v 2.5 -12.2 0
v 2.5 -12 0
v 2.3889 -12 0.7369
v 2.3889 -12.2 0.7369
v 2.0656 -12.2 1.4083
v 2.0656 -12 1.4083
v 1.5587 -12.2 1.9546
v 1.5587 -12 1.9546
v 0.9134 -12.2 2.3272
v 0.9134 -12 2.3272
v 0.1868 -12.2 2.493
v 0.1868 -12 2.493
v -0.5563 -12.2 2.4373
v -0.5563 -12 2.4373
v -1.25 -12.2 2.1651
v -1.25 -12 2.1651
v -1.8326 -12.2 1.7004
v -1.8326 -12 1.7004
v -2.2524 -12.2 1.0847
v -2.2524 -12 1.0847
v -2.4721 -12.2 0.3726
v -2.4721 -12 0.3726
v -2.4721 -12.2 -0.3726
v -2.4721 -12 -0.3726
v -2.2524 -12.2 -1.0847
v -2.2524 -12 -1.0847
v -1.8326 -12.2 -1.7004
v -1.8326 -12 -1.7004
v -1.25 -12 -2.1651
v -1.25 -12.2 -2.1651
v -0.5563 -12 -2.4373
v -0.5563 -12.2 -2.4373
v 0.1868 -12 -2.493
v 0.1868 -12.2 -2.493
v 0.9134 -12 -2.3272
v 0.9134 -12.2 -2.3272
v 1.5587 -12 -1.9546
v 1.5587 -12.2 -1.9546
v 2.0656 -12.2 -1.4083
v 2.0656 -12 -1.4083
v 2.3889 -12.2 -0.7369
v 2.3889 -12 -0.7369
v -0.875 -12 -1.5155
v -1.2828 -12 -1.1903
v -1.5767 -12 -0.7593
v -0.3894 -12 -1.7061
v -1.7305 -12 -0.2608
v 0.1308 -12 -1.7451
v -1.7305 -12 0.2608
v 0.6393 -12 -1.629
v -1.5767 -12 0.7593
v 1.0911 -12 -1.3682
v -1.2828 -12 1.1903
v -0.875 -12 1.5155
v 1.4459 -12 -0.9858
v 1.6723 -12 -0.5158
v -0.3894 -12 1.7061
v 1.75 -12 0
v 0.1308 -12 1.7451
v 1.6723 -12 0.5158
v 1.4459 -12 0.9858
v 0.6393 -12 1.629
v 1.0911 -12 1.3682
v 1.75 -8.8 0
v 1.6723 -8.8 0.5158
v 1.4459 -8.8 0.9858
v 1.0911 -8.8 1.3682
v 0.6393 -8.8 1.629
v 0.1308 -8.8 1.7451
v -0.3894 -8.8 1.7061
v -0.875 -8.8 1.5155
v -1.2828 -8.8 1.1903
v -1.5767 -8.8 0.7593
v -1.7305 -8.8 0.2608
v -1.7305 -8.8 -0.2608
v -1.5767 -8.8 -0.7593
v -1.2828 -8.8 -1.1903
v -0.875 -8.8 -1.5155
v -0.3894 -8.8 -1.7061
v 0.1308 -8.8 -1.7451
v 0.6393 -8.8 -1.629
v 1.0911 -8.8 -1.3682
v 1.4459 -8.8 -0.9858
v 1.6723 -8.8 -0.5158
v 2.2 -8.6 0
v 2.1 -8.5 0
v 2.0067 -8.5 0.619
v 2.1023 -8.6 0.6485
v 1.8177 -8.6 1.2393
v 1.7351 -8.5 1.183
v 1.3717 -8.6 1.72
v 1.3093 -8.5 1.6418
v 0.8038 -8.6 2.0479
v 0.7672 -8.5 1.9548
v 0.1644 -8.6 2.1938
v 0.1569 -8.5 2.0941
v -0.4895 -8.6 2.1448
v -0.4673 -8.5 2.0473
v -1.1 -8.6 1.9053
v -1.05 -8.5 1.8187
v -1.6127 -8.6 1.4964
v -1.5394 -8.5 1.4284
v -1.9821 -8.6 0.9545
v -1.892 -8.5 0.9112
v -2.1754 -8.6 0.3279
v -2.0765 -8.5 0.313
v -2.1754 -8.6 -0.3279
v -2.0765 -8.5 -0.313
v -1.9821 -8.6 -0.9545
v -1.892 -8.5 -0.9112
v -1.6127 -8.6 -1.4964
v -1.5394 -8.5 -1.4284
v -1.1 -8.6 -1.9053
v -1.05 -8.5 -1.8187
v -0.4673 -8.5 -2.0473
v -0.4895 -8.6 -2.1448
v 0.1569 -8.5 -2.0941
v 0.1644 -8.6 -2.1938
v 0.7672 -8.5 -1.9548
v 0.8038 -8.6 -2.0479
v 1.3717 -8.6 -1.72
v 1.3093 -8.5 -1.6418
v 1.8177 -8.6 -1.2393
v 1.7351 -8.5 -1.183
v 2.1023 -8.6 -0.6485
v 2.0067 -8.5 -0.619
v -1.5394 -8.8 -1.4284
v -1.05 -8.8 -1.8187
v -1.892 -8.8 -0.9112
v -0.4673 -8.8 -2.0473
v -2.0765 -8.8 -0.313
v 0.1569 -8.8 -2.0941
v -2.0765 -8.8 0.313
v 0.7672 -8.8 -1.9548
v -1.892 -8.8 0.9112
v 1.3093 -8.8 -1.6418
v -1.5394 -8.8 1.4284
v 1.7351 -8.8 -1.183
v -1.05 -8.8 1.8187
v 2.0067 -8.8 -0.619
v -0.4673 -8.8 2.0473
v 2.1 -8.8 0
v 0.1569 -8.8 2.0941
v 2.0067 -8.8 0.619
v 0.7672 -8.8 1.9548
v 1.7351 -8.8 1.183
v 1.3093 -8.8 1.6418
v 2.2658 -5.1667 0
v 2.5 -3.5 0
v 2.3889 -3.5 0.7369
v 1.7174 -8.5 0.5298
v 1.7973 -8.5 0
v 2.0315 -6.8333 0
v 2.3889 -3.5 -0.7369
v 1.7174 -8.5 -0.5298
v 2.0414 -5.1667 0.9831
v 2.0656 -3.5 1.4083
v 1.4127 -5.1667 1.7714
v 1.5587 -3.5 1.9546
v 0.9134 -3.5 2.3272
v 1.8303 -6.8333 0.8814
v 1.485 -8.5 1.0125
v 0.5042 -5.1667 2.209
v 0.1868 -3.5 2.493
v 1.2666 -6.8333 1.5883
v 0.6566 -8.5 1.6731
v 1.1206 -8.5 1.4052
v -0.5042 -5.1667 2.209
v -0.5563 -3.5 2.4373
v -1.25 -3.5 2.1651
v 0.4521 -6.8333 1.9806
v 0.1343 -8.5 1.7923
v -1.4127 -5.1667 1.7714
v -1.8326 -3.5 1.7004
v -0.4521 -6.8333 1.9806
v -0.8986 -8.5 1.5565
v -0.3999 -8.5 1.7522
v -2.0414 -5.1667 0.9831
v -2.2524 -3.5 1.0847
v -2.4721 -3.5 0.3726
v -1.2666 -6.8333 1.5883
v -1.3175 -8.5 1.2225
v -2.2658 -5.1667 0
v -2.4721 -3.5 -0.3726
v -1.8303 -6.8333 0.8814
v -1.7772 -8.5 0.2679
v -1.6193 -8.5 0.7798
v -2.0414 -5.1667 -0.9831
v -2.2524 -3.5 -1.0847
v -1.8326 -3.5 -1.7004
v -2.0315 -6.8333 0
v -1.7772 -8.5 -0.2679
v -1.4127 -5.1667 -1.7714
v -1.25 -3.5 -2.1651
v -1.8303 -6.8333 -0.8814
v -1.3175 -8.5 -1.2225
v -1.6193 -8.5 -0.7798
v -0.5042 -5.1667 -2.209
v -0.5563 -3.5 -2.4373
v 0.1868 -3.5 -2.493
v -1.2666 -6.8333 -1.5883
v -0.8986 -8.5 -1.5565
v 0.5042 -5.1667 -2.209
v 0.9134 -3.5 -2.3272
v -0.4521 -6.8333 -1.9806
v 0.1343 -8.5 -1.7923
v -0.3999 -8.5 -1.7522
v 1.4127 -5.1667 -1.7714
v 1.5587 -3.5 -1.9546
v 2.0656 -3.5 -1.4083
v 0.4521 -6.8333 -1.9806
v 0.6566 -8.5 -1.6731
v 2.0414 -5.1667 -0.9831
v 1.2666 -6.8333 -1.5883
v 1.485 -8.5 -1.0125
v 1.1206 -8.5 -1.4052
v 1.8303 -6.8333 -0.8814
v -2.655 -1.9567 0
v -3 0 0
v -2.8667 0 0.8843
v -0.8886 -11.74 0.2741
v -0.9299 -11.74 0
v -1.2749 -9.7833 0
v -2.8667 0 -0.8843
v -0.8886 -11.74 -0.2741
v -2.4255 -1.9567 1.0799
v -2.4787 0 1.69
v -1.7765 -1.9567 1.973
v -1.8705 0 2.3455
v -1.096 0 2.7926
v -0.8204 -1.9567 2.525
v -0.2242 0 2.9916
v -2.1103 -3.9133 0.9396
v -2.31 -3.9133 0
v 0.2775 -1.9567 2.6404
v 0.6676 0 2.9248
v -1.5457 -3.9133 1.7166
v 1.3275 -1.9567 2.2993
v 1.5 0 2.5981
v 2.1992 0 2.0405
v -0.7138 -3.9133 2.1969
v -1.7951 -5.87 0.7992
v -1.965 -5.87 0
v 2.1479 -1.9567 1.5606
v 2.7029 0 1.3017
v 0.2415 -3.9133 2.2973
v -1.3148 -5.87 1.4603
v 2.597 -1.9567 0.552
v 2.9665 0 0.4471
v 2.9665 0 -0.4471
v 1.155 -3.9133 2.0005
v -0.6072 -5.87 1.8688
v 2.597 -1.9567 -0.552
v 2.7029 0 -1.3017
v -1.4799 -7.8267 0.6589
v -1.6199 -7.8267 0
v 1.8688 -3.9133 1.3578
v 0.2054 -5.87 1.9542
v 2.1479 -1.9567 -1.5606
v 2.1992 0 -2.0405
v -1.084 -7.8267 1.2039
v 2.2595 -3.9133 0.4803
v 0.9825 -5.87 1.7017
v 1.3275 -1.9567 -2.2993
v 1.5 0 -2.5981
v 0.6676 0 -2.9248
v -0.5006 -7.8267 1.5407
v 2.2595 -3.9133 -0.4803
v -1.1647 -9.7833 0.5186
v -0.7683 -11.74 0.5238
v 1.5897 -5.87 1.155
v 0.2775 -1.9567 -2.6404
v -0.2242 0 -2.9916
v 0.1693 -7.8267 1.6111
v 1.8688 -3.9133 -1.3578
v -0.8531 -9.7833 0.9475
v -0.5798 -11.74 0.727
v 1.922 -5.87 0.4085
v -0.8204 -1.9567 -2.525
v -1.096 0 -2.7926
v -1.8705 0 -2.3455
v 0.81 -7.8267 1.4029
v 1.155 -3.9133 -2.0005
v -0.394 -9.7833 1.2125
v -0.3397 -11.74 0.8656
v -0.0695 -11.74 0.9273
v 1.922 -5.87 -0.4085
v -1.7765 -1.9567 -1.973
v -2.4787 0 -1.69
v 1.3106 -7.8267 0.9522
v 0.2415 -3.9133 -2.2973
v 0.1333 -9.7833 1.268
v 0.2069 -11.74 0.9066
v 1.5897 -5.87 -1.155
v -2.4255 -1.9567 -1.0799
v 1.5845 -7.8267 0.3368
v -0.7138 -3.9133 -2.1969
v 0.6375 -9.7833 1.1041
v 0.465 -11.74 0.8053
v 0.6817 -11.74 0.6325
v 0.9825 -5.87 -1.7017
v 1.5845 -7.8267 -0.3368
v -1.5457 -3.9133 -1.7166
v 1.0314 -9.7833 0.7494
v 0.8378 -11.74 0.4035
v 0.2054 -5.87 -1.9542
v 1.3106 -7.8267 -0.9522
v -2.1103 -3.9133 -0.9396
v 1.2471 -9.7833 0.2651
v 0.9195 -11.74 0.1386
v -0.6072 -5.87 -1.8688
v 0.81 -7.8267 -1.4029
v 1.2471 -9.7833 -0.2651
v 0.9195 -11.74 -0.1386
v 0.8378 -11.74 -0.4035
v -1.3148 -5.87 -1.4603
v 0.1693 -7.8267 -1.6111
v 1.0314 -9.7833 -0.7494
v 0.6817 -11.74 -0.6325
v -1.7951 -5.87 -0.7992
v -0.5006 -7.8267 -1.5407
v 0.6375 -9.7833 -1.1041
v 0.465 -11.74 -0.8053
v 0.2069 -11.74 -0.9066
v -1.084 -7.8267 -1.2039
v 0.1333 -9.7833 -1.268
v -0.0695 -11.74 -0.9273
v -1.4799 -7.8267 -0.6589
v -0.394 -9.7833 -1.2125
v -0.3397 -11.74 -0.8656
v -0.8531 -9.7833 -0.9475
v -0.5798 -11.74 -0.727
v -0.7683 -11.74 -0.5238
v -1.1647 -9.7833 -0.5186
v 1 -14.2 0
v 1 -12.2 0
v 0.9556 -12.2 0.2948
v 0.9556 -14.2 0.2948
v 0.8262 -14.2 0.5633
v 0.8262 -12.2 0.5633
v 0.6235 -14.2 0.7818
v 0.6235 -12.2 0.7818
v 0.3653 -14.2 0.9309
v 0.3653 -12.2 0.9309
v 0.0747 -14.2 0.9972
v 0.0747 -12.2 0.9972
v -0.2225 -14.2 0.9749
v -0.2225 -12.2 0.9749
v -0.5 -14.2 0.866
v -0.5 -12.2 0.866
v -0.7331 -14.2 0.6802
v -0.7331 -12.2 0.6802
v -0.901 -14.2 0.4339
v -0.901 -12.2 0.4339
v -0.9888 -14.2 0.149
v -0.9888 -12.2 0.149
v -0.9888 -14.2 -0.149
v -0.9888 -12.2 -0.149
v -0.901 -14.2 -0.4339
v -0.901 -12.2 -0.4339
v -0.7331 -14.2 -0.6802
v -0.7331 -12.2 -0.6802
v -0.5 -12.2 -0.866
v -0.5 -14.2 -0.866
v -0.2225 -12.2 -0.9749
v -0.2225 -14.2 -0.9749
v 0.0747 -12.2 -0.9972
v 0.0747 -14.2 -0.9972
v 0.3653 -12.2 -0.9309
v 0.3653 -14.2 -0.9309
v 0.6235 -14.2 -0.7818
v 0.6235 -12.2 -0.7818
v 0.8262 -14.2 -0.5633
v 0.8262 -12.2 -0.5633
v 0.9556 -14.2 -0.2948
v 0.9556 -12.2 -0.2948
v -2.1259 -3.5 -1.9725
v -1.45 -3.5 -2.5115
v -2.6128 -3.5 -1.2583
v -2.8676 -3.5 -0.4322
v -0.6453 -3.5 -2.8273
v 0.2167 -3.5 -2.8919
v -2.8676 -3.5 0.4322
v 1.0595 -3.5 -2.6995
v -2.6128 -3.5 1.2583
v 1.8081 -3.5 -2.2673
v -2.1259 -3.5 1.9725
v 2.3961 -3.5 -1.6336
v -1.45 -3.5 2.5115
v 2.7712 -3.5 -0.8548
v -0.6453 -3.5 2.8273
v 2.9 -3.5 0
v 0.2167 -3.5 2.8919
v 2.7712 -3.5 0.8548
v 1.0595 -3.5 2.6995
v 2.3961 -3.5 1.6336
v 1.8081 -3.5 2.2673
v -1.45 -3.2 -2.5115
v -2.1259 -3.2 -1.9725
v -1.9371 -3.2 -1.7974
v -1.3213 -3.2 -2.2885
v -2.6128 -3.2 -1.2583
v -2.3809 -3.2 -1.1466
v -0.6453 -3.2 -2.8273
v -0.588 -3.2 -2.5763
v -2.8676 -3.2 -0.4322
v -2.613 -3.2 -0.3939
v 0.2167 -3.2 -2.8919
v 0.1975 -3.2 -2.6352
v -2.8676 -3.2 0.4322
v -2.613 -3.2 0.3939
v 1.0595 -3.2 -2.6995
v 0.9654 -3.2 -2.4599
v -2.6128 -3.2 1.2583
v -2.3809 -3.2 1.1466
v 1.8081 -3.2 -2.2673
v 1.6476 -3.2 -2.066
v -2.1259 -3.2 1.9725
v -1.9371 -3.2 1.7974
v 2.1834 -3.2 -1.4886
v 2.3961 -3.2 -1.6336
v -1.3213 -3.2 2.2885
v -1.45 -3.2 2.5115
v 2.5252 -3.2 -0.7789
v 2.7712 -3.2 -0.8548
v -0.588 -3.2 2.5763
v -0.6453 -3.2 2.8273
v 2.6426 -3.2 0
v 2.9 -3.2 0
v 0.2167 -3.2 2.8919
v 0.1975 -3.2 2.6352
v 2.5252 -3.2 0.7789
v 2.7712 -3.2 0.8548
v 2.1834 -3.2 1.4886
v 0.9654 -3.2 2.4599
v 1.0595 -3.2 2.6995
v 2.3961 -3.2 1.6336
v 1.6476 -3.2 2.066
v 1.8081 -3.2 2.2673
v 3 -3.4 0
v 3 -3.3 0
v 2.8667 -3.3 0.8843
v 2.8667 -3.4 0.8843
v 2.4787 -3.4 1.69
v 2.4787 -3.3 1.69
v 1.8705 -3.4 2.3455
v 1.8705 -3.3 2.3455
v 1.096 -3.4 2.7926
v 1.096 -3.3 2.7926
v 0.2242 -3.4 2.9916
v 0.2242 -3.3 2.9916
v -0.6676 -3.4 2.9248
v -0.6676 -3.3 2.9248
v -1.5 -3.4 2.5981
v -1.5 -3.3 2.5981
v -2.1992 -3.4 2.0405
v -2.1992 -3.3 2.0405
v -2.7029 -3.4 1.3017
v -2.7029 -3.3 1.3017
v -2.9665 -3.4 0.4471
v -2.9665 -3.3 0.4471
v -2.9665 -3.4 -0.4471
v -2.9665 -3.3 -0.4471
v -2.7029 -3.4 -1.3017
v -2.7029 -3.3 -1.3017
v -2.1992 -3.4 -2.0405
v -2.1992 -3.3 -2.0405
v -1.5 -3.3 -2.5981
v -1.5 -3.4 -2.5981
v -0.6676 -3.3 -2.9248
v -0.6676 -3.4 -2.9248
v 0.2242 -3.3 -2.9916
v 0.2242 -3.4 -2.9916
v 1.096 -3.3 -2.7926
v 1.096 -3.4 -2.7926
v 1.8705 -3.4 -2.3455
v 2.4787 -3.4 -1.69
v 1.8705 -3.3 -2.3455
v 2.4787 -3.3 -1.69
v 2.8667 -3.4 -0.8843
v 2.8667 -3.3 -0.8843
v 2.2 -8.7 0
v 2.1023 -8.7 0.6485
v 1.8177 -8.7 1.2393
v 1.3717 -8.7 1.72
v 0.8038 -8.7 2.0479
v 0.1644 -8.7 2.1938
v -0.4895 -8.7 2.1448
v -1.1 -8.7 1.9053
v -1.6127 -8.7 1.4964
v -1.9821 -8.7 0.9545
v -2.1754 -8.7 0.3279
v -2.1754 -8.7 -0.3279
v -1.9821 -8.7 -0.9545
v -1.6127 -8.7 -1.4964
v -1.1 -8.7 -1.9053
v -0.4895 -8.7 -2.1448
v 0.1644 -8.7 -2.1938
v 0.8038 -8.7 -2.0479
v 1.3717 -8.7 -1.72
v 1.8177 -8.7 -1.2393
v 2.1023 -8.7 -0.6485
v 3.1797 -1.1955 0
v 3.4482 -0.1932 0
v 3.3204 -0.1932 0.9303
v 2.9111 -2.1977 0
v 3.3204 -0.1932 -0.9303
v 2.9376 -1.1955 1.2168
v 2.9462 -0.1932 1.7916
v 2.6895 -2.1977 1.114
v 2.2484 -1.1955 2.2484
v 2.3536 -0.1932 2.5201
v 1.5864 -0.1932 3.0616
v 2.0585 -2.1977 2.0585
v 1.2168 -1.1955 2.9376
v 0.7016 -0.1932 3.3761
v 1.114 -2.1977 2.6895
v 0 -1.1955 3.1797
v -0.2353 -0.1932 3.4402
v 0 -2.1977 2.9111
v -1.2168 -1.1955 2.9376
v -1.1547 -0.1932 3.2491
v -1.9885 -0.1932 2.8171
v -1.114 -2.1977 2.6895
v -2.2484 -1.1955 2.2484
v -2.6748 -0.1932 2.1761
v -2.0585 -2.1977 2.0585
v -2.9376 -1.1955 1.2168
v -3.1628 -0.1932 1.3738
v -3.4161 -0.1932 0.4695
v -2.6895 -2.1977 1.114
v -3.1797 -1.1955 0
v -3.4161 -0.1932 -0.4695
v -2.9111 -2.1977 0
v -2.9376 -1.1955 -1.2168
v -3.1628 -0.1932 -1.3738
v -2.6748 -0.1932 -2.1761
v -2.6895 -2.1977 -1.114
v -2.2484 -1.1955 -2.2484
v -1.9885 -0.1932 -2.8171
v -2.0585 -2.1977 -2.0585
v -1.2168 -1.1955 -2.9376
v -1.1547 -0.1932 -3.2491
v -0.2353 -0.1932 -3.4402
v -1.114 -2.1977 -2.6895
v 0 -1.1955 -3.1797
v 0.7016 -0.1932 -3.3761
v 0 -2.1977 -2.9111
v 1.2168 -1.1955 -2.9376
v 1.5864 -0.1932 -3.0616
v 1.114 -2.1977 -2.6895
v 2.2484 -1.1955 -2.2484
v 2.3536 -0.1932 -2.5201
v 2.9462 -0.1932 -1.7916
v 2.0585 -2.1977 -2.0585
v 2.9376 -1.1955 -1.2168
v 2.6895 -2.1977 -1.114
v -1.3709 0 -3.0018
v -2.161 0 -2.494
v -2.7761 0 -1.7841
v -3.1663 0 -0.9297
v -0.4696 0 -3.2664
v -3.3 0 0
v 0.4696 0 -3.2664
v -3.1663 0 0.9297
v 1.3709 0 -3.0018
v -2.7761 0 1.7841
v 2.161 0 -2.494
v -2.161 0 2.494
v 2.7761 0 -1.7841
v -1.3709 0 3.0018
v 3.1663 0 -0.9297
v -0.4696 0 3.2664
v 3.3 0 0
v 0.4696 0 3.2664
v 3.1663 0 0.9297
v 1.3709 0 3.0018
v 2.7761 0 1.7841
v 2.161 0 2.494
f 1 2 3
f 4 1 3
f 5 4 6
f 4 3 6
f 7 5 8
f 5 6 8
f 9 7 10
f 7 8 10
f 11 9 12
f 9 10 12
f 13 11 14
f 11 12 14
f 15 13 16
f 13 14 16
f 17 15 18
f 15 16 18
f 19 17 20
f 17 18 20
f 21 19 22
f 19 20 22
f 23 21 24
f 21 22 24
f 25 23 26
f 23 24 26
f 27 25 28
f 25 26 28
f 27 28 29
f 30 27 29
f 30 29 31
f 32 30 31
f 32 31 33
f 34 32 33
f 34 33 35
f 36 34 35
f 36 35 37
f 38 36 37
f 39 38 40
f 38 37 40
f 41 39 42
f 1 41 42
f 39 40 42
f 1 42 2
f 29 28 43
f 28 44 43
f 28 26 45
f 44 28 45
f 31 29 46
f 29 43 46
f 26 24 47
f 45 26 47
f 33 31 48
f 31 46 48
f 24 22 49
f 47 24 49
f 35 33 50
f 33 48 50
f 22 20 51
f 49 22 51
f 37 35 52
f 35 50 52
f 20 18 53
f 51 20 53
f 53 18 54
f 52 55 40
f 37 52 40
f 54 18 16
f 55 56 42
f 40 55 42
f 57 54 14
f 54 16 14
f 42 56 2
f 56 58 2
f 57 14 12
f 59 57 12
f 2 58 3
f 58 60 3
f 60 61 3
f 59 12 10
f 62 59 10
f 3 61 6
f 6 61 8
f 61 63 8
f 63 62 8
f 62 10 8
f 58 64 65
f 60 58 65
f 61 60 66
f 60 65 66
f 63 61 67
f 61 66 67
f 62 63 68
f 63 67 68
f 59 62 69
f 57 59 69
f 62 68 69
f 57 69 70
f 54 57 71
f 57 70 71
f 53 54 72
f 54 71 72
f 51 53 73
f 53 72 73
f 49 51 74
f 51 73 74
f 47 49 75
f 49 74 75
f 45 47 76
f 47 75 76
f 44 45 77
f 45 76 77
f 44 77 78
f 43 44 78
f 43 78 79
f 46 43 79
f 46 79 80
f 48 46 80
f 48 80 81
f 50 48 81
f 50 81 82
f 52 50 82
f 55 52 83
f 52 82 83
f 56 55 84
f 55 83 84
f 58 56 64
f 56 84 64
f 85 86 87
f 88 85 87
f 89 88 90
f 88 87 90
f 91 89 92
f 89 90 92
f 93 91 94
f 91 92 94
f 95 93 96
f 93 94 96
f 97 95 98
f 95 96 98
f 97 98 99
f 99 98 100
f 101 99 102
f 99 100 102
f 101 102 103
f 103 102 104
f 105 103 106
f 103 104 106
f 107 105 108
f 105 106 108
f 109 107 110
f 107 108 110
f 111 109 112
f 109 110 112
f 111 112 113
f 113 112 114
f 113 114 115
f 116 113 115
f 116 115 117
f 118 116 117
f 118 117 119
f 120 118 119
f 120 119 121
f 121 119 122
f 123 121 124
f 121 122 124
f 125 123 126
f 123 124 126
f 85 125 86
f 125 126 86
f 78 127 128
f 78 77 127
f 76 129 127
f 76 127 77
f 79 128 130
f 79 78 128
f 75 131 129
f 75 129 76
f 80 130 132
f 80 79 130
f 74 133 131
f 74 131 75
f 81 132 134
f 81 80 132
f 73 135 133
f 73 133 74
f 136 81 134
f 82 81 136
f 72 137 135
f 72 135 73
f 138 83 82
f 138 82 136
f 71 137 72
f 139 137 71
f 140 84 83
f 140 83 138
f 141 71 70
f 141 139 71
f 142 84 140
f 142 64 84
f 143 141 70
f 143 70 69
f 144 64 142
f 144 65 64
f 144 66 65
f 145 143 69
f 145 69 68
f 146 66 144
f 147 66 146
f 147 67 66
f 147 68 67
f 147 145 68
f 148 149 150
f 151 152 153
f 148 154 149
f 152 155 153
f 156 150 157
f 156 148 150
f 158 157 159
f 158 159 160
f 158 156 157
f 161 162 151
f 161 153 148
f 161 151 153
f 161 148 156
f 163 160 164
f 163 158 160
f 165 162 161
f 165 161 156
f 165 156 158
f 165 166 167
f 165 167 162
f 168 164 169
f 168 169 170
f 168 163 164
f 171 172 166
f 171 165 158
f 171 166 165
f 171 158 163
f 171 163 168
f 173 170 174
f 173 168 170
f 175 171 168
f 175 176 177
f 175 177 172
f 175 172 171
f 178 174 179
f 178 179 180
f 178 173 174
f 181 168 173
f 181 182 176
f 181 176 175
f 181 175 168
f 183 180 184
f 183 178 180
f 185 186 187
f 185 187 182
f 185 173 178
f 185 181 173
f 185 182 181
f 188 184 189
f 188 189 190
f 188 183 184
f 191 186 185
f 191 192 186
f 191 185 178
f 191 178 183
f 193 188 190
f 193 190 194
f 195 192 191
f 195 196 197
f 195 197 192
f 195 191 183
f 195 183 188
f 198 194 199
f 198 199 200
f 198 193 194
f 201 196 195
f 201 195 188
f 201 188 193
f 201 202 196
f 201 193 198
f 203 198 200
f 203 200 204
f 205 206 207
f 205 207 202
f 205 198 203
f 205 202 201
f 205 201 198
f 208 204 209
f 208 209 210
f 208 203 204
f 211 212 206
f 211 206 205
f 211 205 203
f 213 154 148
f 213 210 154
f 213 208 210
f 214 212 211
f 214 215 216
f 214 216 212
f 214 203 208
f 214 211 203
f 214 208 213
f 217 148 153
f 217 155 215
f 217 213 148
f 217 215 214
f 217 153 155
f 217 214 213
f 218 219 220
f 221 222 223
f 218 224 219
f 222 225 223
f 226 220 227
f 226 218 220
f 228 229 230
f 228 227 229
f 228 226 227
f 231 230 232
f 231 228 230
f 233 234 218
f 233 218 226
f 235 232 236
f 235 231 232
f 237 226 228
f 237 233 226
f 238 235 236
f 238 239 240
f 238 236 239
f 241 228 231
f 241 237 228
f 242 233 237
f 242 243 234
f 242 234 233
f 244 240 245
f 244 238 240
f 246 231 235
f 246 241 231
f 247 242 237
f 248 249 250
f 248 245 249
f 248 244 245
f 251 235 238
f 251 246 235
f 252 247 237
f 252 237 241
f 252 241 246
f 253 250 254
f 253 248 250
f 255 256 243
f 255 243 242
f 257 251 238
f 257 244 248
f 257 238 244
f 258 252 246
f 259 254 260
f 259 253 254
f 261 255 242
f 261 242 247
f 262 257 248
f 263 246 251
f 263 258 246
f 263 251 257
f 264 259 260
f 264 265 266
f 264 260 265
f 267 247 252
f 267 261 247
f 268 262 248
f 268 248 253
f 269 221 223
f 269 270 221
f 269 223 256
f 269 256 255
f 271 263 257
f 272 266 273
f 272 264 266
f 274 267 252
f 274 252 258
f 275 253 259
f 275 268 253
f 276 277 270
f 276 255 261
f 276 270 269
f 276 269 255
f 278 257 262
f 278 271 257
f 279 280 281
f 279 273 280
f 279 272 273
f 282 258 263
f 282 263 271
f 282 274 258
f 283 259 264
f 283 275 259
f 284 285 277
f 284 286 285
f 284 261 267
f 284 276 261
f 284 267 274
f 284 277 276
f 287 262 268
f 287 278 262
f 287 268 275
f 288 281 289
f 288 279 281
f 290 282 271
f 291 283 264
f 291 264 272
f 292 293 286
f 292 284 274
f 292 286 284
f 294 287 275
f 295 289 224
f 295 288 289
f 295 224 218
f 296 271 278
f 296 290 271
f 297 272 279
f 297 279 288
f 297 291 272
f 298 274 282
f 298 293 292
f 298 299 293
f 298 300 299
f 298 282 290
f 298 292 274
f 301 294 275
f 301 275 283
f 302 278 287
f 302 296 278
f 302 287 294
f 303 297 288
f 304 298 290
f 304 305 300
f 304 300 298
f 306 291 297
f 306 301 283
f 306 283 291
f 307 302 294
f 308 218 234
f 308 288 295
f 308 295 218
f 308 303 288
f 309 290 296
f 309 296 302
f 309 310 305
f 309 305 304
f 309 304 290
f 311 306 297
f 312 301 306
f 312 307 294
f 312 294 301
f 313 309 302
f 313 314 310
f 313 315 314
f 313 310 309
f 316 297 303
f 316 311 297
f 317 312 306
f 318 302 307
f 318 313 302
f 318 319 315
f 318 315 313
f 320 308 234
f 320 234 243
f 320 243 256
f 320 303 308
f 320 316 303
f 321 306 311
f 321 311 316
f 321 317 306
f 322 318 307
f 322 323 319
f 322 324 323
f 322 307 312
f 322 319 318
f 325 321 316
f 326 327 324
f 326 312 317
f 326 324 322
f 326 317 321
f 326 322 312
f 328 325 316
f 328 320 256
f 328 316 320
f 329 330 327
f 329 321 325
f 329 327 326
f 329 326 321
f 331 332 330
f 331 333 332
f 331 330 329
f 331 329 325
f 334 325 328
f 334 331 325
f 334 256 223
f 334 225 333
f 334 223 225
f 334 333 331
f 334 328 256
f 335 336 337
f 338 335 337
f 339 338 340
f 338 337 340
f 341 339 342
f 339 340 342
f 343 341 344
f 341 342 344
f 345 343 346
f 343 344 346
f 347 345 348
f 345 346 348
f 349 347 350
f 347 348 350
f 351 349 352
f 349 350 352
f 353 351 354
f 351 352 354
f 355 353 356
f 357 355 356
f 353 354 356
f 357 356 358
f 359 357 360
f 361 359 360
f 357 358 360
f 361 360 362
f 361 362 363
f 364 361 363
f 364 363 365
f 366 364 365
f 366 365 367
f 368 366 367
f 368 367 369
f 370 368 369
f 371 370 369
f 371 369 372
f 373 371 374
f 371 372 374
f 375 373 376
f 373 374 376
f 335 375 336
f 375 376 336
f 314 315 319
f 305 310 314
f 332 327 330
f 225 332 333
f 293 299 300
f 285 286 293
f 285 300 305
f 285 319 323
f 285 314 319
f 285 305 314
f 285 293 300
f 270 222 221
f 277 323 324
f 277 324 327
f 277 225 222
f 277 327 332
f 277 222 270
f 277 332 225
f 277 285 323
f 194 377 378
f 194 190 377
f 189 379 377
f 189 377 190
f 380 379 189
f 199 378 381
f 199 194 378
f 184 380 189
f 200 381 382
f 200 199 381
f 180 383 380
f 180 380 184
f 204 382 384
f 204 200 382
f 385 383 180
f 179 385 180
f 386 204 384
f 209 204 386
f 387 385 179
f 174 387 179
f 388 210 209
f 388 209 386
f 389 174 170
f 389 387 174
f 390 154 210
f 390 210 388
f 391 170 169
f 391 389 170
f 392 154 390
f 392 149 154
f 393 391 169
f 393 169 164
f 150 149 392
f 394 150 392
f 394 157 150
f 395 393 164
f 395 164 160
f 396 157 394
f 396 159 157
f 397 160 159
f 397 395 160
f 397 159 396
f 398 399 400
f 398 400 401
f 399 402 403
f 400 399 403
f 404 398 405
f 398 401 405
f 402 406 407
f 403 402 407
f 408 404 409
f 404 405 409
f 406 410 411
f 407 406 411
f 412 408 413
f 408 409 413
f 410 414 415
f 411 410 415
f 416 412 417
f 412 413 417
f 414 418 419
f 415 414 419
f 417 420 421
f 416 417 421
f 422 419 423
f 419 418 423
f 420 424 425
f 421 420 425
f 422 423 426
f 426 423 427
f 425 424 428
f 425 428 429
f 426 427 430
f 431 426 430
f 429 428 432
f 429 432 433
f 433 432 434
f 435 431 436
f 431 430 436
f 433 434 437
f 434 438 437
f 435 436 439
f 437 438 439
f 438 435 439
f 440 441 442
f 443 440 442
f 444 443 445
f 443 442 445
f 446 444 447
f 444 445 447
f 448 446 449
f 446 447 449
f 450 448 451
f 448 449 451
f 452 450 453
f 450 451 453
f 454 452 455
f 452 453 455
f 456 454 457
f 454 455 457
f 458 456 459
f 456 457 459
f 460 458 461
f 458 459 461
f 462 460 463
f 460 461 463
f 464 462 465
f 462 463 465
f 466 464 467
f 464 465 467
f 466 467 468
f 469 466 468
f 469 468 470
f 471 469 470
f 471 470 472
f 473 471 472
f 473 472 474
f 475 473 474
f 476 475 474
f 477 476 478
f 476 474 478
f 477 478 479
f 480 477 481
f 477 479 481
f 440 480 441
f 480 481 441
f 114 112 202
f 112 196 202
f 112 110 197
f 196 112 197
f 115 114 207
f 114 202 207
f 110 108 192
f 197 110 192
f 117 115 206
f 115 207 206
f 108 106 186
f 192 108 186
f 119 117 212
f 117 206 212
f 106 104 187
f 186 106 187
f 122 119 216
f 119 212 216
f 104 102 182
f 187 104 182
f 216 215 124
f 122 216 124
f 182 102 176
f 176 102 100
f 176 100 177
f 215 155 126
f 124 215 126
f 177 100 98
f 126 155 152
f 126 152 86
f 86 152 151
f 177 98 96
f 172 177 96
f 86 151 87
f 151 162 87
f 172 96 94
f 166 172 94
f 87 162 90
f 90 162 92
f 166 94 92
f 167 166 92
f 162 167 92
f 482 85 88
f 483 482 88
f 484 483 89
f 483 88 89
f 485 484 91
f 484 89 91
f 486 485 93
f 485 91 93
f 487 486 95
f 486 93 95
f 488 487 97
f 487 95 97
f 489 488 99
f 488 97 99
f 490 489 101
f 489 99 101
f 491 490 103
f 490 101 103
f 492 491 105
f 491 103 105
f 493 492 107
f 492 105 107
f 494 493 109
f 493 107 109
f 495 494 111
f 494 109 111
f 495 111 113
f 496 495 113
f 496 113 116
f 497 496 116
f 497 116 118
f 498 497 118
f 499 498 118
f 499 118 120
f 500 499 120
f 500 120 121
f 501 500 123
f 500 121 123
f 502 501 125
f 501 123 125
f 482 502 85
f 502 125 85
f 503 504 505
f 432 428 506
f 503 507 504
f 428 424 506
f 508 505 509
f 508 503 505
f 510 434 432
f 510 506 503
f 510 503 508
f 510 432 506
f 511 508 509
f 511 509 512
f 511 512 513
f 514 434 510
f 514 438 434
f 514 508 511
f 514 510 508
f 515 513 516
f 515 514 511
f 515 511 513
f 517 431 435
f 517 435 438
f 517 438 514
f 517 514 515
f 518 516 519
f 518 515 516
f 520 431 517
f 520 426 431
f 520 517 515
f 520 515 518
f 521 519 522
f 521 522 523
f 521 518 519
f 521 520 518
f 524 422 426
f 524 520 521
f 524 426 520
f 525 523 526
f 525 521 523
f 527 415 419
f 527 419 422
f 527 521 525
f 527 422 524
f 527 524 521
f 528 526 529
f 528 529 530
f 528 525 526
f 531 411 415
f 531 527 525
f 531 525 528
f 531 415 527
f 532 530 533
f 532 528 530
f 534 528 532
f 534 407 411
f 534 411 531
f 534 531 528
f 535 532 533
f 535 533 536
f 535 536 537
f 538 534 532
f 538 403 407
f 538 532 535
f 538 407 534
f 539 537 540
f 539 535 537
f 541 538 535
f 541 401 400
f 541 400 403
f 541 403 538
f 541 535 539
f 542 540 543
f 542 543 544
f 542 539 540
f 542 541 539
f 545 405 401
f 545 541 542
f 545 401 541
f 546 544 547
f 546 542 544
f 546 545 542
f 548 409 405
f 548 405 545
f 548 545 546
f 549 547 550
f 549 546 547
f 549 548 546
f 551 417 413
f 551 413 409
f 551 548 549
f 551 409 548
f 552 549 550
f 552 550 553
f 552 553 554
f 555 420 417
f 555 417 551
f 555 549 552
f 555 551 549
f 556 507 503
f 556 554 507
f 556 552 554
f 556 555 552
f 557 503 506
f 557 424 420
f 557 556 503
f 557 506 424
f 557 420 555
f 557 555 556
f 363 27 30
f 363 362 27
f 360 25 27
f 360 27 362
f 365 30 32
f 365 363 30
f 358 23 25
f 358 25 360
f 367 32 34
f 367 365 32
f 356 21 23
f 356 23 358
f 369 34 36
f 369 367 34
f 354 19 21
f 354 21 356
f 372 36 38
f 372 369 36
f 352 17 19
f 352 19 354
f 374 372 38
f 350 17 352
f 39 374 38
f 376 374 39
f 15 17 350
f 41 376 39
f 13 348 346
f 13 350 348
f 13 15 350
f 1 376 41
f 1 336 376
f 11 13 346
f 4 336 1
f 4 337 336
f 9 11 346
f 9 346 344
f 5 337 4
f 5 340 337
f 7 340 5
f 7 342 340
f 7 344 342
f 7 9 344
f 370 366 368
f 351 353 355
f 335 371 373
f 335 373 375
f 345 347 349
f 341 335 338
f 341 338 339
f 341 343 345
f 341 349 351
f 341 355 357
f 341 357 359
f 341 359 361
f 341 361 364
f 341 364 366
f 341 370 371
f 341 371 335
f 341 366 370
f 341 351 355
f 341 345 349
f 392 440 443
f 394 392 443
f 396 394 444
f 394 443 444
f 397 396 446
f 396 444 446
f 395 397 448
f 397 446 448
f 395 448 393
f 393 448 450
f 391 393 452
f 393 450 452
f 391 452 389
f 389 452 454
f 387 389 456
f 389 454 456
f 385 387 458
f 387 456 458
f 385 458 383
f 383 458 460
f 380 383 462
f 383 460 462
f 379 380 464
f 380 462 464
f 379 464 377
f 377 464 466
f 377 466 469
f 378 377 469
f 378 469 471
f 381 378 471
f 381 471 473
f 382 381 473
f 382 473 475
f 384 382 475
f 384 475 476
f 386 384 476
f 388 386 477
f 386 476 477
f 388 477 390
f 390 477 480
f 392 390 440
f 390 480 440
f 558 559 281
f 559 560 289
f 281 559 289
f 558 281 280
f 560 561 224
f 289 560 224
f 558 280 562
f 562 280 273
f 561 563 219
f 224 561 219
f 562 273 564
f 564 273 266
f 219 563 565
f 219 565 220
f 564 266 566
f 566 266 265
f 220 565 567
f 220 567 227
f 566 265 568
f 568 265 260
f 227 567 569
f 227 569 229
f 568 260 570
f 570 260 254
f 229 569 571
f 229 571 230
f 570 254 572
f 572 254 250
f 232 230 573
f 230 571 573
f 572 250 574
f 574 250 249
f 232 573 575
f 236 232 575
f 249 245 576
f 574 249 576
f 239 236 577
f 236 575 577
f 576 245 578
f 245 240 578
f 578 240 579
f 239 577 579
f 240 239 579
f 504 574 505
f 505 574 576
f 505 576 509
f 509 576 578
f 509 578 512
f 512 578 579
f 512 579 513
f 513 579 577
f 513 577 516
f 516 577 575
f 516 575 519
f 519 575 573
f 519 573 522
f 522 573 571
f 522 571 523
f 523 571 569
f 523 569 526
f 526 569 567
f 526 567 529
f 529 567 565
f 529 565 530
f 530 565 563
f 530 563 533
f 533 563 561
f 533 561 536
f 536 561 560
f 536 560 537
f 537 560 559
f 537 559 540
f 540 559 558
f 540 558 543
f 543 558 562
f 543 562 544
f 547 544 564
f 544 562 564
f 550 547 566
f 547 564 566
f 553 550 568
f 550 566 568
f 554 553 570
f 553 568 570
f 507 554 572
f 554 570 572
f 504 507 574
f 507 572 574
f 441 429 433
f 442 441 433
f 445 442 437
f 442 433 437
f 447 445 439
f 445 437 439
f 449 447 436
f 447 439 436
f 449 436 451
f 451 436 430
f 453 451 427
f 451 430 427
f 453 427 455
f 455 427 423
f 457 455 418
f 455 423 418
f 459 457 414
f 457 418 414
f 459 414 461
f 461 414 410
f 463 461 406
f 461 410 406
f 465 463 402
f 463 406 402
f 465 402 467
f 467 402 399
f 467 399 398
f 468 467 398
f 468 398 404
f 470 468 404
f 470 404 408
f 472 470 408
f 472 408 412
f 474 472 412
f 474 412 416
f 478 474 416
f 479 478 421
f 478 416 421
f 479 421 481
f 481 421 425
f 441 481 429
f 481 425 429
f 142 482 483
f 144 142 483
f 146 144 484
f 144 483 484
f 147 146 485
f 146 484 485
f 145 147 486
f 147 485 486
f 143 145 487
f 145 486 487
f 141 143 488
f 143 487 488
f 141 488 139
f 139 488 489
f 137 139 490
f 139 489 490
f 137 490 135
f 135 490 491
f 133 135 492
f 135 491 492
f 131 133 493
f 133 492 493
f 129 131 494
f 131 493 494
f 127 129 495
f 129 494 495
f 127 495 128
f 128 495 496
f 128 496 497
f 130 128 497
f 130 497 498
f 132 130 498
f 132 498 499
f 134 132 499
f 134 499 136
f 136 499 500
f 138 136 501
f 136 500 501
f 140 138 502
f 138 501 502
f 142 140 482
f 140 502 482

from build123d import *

# Parameters (mm, degrees)
F0_R      = 3.5
F1_DEPTH  = 3.2
F1_TAPER  = 15
F2_R      = 3
F3_DEPTH  = 0.3
F4_SIZE   = 0.2
F5_R      = 2.5
F6_DEPTH  = 5
F6_TAPER  = 8
F7_R      = 2.2
F8_DEPTH  = 0.3
F9_R      = 1.75
F10_DEPTH = 3.2
F11_R     = 2.5
F12_DEPTH = 0.2
F13_R     = 1
F14_DEPTH = 2
F15_SIZE  = 0.1
F16_R     = 3
F17_DEPTH = 11.74
F17_TAPER = 10


with BuildPart() as f1:
    # F0 (on Front) → F1 (new body)
    with BuildSketch(Plane.XZ):
        Circle(F0_R)
    extrude(amount=F1_DEPTH, taper=F1_TAPER)

    # F2 (on face) → F3 (join)
    with BuildSketch(Plane.XZ.offset(3.2)):
        Circle(F2_R)
    extrude(amount=F3_DEPTH)

    # F4
    f4_edges = [f1.edges().sort_by_distance(p)[0] for p in [
        (-3.5, 0, 0),
    ]]
    chamfer(f4_edges, length=F4_SIZE)

    # F5 (on face) → F6 (join)
    with BuildSketch(Plane.XZ.offset(3.5)):
        Circle(F5_R)
    extrude(amount=F6_DEPTH, taper=F6_TAPER)

    # F7 (on face) → F8 (join)
    with BuildSketch(Plane.XZ.offset(8.5)):
        Circle(F7_R)
    extrude(amount=F8_DEPTH)

    # F9 (on face) → F10 (join)
    with BuildSketch(Plane.XZ.offset(8.8)):
        Circle(F9_R)
    extrude(amount=F10_DEPTH)

    # F11 (on face) → F12 (join)
    with BuildSketch(Plane.XZ.offset(12)):
        Circle(F11_R)
    extrude(amount=F12_DEPTH)

    # F13 (on face) → F14 (join)
    with BuildSketch(Plane.XZ.offset(12.2)):
        Circle(F13_R)
    extrude(amount=F14_DEPTH)

    # F15
    f15_edges = [f1.edges().sort_by_distance(p)[0] for p in [
        (-3, -3.5, 0),
        (-2.2, -8.8, 0),
        (-2.2, -8.5, 0),
        (-3, -3.2, 0),
    ]]
    chamfer(f15_edges, length=F15_SIZE)

    # F16 (on face) → F17 (cut, symmetric)
    with BuildSketch(Plane(origin=(0, 0, 0), x_dir=(-1, 0, 0), z_dir=(0, 1, 0))):
        Circle(F16_R)
    extrude(amount=F17_DEPTH, both=True, taper=F17_TAPER, mode=Mode.SUBTRACT)


solid = f1.part
